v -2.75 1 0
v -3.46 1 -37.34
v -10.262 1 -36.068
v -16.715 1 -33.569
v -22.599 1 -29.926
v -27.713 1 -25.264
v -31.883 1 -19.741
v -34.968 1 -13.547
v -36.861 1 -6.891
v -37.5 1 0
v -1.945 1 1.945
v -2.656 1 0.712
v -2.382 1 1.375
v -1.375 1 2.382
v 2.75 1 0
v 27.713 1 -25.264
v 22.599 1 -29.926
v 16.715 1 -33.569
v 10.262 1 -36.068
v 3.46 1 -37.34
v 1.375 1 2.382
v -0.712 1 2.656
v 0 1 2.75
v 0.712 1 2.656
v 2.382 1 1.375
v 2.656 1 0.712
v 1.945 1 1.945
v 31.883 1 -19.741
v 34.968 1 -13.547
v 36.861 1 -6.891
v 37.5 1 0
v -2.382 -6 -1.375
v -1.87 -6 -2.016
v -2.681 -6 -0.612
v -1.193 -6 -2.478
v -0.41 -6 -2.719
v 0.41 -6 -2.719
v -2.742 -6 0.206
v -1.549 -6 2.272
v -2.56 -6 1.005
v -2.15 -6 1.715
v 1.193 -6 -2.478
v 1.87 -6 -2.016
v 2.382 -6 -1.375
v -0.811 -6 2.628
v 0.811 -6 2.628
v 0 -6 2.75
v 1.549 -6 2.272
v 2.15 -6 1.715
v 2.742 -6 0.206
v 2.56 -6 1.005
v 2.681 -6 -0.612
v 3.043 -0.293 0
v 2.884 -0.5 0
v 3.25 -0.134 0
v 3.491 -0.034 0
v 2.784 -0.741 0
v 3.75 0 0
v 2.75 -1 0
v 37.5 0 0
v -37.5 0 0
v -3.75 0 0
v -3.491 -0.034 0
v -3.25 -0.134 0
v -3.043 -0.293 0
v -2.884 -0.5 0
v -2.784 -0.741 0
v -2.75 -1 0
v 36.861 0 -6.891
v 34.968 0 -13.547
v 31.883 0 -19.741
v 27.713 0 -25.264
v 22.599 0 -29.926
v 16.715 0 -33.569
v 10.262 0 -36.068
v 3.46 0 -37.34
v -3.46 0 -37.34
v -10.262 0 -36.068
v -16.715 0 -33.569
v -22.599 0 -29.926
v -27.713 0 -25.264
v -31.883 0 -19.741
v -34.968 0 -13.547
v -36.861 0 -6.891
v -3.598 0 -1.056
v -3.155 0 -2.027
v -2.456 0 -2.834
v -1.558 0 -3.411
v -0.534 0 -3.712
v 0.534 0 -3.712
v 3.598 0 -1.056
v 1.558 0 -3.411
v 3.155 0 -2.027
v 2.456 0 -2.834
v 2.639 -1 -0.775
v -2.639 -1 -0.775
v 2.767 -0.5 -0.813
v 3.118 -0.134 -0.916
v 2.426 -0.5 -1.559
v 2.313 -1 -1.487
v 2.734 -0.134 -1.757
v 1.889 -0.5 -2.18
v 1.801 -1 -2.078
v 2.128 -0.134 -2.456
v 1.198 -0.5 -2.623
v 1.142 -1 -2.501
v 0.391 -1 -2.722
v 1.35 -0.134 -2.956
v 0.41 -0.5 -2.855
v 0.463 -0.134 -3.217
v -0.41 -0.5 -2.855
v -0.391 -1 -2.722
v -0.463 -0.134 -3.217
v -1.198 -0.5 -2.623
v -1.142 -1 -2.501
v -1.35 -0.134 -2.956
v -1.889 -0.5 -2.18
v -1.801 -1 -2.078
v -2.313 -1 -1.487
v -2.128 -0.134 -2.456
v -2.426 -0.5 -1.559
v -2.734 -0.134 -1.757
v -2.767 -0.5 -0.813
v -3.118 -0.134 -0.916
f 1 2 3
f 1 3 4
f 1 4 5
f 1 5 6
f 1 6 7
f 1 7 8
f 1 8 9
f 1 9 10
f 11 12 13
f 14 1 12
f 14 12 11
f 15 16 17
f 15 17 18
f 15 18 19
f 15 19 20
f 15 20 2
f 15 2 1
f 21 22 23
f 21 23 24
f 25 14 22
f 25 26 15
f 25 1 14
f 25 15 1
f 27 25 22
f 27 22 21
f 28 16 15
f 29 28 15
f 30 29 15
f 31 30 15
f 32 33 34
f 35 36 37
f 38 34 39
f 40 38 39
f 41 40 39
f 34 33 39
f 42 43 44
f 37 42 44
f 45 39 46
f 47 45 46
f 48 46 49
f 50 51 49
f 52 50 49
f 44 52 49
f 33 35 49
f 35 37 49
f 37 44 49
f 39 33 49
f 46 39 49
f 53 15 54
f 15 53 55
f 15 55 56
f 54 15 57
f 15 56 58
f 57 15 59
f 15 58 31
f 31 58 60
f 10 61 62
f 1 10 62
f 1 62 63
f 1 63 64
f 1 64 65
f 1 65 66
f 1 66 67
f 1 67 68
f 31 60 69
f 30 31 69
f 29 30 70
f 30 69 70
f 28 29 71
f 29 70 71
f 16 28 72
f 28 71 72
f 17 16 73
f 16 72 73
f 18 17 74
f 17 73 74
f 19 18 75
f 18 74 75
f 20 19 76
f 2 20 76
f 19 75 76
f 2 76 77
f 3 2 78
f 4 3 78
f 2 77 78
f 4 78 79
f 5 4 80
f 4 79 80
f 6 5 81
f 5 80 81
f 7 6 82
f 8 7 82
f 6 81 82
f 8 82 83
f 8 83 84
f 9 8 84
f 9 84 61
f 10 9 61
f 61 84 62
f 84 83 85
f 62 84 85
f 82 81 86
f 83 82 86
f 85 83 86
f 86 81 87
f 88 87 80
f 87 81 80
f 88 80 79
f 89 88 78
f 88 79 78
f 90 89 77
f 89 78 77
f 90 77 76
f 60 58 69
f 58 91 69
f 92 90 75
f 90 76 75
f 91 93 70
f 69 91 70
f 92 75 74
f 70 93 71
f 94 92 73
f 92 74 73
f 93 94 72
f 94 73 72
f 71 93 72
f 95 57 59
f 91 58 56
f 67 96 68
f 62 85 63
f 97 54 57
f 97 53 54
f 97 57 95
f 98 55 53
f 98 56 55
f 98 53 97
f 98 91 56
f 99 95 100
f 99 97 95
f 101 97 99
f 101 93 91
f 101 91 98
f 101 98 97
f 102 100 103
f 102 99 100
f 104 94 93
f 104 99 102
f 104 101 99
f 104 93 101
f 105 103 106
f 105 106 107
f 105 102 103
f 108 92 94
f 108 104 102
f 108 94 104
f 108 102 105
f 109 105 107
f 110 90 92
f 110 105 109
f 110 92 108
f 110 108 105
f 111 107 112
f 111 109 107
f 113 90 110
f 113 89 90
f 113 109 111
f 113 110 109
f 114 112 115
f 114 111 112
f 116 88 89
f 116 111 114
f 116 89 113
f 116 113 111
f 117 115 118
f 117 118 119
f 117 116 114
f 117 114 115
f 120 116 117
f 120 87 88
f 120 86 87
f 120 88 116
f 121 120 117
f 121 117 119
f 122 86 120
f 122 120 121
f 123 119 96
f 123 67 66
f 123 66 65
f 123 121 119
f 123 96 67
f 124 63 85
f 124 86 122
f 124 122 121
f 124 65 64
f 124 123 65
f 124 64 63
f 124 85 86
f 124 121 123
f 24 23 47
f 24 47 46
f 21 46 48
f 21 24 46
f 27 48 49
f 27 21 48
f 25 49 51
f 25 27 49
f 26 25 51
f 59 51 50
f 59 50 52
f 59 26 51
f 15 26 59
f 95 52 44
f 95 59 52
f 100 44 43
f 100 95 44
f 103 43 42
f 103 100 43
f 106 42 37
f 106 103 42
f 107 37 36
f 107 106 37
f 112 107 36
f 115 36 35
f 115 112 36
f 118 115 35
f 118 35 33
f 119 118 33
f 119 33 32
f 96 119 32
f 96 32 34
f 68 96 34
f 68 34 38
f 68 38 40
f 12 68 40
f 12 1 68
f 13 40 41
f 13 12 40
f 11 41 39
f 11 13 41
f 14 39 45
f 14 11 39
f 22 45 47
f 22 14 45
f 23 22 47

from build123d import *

# Parameters (mm, degrees)
BOSS_EXTRUDE1_DEPTH = 1
SKETCH3_R           = 2.75
BOSS_EXTRUDE2_DEPTH = 7
FILLET1_R           = 1


with BuildPart() as part:
    # Sketch1 → Boss-Extrude1 (new body)
    with BuildSketch(Plane(origin=(0, 0, 0), x_dir=(1, 0, 0), z_dir=(0, 1, 0))):
        with BuildLine():
            Line((-37.5, 0), (37.5, 0))
            ThreePointArc((37.5, 0), (0, 37.5), (-37.5, 0))
        make_face()
    extrude(amount=BOSS_EXTRUDE1_DEPTH)

    # Sketch3 → Boss-Extrude2 (add)
    with BuildSketch(Plane(origin=(0, 1, 0), x_dir=(1, 0, 0), z_dir=(0, 1, 0))):
        with Locations(Location((0, 0, 0), (0, 0, 270))):
            Circle(SKETCH3_R)
    extrude(amount=-BOSS_EXTRUDE2_DEPTH)

    # Fillet1
    fillet1_edges = [part.edges().sort_by_distance(p)[0] for p in [
        (0, 0, -2.75),
    ]]
    fillet(fillet1_edges, radius=FILLET1_R)


solid = part.part
